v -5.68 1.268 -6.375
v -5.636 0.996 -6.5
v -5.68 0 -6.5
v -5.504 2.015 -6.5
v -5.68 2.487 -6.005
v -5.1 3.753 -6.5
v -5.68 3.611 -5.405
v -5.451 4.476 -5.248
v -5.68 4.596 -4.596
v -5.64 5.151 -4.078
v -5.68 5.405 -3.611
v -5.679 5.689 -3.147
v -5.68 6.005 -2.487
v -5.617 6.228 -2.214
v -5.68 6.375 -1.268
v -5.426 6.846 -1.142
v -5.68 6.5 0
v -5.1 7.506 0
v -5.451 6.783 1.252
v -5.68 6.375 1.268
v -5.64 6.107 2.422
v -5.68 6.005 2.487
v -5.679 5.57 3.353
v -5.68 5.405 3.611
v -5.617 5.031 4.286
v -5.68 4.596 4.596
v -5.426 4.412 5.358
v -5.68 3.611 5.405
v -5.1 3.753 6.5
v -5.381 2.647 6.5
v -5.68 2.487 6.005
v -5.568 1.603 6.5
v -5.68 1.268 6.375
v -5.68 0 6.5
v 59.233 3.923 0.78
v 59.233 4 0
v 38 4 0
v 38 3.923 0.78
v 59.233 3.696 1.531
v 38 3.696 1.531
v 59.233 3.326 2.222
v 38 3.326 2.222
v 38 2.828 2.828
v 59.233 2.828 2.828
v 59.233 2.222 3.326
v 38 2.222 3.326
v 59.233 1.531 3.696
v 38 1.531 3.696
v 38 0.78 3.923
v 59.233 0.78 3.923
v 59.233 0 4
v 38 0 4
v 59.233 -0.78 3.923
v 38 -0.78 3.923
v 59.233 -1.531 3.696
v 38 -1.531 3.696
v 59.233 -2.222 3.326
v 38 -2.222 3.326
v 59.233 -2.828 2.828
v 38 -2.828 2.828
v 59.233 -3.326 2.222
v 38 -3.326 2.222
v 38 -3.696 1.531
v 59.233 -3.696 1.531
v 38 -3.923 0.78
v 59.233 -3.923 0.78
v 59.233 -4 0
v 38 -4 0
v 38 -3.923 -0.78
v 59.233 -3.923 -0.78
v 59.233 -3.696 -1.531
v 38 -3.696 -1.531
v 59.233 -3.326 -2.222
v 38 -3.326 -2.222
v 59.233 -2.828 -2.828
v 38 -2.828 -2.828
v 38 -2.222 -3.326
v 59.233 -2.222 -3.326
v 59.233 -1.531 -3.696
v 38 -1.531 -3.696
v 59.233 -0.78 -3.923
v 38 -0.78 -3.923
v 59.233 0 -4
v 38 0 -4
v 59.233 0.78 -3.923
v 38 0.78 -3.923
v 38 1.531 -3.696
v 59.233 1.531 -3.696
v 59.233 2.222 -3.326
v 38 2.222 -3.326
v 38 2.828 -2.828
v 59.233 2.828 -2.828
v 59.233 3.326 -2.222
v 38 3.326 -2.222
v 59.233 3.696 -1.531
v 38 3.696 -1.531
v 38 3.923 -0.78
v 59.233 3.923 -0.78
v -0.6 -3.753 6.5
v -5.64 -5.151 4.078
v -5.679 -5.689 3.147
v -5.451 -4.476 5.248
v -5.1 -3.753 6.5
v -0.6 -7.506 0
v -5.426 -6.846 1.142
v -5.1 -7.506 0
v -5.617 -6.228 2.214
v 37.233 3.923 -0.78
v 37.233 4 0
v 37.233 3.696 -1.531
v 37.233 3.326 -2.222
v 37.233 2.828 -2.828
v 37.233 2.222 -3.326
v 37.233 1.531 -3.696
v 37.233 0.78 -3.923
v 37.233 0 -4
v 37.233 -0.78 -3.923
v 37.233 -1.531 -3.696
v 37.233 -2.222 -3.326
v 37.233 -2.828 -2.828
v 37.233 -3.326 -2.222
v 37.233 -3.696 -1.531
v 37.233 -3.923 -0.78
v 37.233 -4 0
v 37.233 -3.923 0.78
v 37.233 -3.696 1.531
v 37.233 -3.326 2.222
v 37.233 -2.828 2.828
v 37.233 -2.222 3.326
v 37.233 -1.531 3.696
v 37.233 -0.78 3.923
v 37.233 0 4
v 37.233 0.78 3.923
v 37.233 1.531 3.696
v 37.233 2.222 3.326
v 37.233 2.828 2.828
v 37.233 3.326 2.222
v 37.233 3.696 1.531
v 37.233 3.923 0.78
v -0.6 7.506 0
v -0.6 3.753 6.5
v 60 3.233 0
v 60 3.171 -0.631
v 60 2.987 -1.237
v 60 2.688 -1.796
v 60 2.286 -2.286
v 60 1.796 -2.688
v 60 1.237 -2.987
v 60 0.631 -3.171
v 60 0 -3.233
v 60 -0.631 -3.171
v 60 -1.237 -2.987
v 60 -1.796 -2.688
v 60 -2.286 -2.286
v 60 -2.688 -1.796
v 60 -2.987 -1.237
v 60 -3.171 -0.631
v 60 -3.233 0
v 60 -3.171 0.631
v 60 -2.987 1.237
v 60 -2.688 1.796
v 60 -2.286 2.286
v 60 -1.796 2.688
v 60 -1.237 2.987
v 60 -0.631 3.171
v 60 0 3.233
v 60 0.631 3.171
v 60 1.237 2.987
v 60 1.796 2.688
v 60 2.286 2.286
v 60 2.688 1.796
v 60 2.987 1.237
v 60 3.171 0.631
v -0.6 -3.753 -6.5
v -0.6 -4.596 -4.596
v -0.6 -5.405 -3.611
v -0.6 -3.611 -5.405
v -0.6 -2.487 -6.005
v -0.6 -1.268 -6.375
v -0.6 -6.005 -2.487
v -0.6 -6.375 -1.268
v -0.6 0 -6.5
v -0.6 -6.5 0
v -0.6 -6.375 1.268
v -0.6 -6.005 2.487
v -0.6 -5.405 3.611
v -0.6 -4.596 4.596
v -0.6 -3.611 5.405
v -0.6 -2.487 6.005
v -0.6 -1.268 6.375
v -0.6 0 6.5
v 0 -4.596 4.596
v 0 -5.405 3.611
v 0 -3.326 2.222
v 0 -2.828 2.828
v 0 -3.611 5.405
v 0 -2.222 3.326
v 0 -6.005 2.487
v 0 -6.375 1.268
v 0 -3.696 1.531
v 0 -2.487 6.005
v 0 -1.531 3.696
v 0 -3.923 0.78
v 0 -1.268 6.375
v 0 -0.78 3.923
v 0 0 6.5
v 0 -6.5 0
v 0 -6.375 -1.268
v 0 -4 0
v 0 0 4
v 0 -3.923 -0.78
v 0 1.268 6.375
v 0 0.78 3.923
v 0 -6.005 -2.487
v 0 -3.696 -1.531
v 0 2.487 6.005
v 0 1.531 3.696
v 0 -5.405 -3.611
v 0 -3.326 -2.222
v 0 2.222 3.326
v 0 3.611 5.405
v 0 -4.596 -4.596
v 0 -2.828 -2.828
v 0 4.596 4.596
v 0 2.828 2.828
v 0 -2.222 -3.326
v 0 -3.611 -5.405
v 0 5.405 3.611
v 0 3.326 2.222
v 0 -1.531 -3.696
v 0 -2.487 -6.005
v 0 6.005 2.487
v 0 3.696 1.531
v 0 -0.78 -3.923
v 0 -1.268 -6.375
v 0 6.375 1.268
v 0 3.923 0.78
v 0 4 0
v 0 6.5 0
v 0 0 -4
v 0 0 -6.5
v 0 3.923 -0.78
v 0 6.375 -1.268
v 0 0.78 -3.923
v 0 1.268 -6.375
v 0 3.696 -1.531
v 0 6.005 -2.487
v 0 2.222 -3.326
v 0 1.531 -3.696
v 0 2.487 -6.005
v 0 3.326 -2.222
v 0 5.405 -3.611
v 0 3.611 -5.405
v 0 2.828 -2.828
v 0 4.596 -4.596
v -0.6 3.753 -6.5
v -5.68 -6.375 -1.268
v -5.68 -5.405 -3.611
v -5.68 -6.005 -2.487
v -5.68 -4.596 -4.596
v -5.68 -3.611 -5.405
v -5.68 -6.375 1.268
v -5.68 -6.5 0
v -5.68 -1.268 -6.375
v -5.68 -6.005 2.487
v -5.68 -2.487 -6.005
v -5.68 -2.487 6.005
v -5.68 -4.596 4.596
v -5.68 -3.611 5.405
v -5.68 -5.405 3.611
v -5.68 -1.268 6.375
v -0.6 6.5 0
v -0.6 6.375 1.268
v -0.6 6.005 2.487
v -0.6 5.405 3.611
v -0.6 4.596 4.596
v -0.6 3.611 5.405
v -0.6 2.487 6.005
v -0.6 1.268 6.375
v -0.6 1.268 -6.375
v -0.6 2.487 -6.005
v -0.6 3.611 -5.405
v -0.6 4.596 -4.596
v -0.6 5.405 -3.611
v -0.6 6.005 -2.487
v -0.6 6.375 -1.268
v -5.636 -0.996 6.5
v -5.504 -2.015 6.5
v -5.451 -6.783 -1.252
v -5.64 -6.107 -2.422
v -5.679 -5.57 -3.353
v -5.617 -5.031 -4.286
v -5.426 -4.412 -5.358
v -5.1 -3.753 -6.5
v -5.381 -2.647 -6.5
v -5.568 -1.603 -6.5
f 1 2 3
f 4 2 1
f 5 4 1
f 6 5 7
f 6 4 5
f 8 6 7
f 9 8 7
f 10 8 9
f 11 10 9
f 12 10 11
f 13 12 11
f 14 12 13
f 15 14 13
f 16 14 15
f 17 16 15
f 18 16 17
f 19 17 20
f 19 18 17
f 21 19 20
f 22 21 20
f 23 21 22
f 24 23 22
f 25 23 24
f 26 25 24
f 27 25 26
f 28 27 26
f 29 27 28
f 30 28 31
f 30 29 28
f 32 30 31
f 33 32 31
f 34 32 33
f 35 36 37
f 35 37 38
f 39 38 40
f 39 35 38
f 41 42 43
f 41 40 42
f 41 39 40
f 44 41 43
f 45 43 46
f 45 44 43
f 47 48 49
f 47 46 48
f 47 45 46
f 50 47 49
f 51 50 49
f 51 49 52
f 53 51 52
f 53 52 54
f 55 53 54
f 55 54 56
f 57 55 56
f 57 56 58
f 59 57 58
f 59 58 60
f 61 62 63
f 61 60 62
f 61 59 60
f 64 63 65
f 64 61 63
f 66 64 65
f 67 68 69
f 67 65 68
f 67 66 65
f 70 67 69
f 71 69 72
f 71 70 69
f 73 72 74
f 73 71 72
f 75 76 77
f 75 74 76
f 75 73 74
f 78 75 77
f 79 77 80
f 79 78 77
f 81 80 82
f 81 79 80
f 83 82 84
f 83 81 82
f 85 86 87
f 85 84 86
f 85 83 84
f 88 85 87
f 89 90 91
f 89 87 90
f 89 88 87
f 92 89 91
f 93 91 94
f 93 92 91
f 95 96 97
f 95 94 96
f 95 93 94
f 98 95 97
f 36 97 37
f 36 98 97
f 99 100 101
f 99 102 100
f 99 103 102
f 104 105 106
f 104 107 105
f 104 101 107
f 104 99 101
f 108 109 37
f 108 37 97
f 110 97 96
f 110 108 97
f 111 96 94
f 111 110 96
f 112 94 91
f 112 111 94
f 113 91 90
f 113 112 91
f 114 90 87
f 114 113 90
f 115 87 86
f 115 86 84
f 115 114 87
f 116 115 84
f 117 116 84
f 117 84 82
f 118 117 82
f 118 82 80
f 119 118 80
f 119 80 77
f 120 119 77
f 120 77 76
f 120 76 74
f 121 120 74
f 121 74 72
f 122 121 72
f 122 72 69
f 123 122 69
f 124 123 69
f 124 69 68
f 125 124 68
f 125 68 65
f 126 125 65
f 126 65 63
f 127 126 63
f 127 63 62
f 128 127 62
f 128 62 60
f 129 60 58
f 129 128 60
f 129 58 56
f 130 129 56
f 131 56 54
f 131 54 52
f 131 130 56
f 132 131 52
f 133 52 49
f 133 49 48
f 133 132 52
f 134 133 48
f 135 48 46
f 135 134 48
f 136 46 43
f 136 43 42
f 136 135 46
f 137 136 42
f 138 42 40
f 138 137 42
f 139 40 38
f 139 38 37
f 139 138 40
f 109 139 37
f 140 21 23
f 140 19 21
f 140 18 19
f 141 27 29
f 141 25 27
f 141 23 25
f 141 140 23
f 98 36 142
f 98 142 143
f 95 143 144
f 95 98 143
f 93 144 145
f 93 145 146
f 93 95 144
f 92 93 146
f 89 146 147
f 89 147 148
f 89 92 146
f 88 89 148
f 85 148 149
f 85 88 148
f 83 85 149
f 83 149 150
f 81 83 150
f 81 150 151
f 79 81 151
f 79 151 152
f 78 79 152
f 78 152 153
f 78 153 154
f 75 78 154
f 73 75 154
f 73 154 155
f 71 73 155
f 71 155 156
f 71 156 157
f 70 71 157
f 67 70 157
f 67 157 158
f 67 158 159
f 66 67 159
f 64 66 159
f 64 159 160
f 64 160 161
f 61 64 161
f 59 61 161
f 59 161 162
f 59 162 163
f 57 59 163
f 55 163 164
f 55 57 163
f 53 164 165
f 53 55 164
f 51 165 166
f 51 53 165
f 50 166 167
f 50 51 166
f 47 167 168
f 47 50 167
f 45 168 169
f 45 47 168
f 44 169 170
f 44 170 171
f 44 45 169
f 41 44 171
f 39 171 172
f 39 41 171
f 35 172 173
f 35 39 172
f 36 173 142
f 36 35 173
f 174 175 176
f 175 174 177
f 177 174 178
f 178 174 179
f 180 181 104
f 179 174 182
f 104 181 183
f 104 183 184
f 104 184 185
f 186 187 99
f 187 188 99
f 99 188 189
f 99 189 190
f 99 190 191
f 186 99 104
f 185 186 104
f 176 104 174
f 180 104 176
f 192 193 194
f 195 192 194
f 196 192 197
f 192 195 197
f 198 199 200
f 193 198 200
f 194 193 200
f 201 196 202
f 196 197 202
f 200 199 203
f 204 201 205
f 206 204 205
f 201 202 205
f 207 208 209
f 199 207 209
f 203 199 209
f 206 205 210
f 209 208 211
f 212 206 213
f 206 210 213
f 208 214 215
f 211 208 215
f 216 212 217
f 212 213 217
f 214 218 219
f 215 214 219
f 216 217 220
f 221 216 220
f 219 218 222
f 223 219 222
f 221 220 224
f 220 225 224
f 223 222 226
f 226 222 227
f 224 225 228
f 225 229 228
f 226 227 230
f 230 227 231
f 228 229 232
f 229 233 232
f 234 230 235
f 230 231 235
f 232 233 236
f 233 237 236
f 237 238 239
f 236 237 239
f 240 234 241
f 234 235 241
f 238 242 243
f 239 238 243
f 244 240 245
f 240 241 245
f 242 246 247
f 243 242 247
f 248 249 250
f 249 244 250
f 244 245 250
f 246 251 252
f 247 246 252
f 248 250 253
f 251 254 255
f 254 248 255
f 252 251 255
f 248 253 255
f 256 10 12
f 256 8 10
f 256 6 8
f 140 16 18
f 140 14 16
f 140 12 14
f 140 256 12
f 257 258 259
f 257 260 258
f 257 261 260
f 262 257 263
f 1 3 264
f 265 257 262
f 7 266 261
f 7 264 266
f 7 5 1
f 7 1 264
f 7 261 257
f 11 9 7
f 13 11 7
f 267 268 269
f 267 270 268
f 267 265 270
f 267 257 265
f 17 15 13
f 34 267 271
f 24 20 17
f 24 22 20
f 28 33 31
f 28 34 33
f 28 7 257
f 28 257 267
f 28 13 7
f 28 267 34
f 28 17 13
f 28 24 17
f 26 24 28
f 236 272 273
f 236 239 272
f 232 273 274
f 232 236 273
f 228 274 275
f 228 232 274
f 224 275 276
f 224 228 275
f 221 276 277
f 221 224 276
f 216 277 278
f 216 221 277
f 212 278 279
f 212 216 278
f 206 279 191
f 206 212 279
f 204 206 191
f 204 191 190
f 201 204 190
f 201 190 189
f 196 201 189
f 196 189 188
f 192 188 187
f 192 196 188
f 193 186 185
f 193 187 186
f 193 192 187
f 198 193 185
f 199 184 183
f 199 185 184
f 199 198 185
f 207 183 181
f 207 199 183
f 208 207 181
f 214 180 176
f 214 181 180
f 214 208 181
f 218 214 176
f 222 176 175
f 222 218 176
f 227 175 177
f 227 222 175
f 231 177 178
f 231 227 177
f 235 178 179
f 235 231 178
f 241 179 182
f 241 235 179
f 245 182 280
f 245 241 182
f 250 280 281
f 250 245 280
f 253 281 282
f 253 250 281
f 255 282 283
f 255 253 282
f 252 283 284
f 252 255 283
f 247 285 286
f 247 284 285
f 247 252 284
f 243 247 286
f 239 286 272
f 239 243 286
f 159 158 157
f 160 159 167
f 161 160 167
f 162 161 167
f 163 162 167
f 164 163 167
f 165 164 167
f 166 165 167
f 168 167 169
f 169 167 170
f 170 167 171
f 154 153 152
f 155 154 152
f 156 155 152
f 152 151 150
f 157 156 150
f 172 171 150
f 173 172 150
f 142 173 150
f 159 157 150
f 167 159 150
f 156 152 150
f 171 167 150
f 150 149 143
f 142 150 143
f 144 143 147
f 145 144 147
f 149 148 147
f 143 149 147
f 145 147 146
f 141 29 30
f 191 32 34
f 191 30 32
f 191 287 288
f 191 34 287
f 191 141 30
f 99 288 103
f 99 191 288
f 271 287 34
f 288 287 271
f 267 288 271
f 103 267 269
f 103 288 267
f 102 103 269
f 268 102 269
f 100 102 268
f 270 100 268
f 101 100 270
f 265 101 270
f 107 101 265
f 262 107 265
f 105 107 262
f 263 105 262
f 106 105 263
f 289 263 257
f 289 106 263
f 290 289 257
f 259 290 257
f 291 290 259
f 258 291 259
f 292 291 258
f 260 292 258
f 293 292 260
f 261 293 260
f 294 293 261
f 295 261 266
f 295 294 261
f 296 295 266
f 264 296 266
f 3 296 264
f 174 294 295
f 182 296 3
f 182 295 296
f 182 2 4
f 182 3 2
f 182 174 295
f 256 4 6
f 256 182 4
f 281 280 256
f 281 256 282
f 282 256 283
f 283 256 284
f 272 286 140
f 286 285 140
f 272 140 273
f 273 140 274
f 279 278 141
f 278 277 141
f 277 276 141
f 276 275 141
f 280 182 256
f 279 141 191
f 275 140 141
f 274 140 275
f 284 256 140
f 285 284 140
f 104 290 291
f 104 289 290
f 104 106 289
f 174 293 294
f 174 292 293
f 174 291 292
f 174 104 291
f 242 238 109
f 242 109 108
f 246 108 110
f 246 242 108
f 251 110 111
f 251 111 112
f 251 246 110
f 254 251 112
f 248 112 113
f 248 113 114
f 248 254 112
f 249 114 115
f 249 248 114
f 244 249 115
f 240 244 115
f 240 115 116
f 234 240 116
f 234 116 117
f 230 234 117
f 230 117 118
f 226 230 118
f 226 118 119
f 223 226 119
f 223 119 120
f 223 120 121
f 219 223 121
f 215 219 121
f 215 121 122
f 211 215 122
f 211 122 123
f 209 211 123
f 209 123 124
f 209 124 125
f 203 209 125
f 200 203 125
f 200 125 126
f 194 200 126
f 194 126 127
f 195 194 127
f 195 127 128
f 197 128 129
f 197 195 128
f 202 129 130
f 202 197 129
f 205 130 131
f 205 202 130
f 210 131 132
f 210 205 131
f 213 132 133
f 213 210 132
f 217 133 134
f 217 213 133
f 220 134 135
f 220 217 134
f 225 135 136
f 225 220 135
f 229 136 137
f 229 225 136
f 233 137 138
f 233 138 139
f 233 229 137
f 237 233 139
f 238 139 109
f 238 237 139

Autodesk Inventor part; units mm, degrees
ref_plane "YZ Plane" through (0, 0, 0) normal (1, 0, 0) x (0, 1, 0)
ref_plane "XZ Plane" through (0, 0, 0) normal (0, 1, 0) x (-1, 0, 0)
sketch "Sketch1" plane through (0, 0, 0) normal (0, 0, 1) x (1, 0, 0)
  line L0 (0, 6.5) -> (0, 4)
  line L1 (38, 4) -> (60, 4)
  line L2 (60, 4) -> (60, 0)
  line L3 (60, 0) -> (-0.6001, 0)
  line L4 (-12.7201, 0) -> (72.12, 0) projected
  line L5 (-0.6001, 0) -> (-0.6001, 6.5)
  line L6 (-0.6001, 6.5) -> (0, 6.5)
  line L7 (38, 4) -> (37.2331, 4)
  line L8 (37.2331, 4) -> (0, 4)
  line L9 (0, -1.3) -> (0, 7.8) projected
  dimension "d0" = 60
  dimension "d1" = 22
  dimension "d2" = 8
  dimension "d9" = 0.6001
  dimension "d10" = 13
  dimension "d13" = 0.7669
  dimension "d14" = 8
revolve "Body" add sketch "Sketch1" angle 360 about axis through (60, 0, 0) along (-1, 0, 0)
sketch "Sketch2" plane through (-0.6001, 0, 0) normal (-1, 0, 0) x (0, 0, 1)
  line L0 (0, 7.5056) -> (6.5, 3.7528)
  line L1 (6.5, 3.7528) -> (6.5, -3.7528)
  line L2 (6.5, -3.7528) -> (0, -7.5056)
  line L3 (0, -7.5056) -> (-6.5, -3.7528)
  line L4 (-6.5, -3.7528) -> (-6.5, 3.7528)
  line L5 (-6.5, 3.7528) -> (0, 7.5056)
  point P0 (0, 0)
  point P1 (0, 0)
  dimension "d11" = 13
extrude "Head" add sketch "Sketch2" along normal blind 5.08
sketch "Sketch4" plane through (0, 0, 0) normal (0, 0, 1) x (1, 0, 0)
  line L0 (-5.6801, 6.5) -> (-5.6801, 7.5056)
  line L1 (-5.6801, 7.5056) -> (-5.0995, 7.5056)
  line L2 (-5.0995, 7.5056) -> (-5.6801, 6.5)
  line L3 (-6.6961, 0) -> (0.4159, 0) projected
  line L4 (-0.6001, 7.5056) -> (-5.6801, 7.5056) projected
  line L5 (-5.6801, 3.7528) -> (-5.6801, 7.5056) projected
  dimension "d5" = 30
  dimension "d19" = 13
revolve "Chamfer1" cut sketch "Sketch4" angle 360 about axis through (-10, 0, 0) along (1, 0, 0)
thread "Thread" size "M8x1.25" class "6g" standard "ISO Metric profile" length 22
chamfer "Chamfer2" distance 0.7668 distance2 0.7669 1 edges at (60, -4, 0) measured on face at (60, -0.1514, -1.2467)
ref_plane "Work Plane1" through (1.525, 0, 0) normal (0, 0, 1) x (1, 0, 0)
equation "\"d0\" = NLG"
equation "\"d1\" = GEL"
equation "\"d2\" = GD"
equation "\"d10\" = SD2"
equation "\"d14\" = BDM"
equation "\"d11\" = SW"
equation "\"d3\" = KOH - SD"
equation "\"d5\" = ANG1"
equation "\"d19\" = SW0"
equation "\"d15\" = GEL"
equation "\"d6\" = -0.5 * SPD + 0.5 * GD"
equation "\"NLG\" = 60"
equation "\"GD\" = NND"
equation "\"BDM\" = NND"
equation "\"KOH\" = 5.68"
equation "\"GEL\" = 22"
equation "\"SW\" = 13"
equation "\"SW0\" = SW"
equation "\"SPD\" = NND - 1.2269 * PTC"
equation "\"SD2\" = SW"
equation "\"SD\" = 0.6"
equation "\"ANG1\" = 30deg"
equation "\"GAL\" = 0.61345 * PTC"
equation "\"GUL\" = 0.61345 * PTC"
equation "\"RR\" = 0.4"
equation "\"WFT\" = SD"
equation "\"GD1\" = THREADDIA - 1.2269 * PTC"
equation "\"THREADDIA\" = 8"
equation "\"SDH\" = SW"
equation "\"TOA\" = 30deg"
equation "\"FAWI\" = 45deg"
equation "\"PTC\" = 1.25"
equation "\"NND\" = 8"
equation "\"E0\" = 1.155 * SW"
properties part number "AS 1111 - M8 x 60" material "Steel, Mild"
